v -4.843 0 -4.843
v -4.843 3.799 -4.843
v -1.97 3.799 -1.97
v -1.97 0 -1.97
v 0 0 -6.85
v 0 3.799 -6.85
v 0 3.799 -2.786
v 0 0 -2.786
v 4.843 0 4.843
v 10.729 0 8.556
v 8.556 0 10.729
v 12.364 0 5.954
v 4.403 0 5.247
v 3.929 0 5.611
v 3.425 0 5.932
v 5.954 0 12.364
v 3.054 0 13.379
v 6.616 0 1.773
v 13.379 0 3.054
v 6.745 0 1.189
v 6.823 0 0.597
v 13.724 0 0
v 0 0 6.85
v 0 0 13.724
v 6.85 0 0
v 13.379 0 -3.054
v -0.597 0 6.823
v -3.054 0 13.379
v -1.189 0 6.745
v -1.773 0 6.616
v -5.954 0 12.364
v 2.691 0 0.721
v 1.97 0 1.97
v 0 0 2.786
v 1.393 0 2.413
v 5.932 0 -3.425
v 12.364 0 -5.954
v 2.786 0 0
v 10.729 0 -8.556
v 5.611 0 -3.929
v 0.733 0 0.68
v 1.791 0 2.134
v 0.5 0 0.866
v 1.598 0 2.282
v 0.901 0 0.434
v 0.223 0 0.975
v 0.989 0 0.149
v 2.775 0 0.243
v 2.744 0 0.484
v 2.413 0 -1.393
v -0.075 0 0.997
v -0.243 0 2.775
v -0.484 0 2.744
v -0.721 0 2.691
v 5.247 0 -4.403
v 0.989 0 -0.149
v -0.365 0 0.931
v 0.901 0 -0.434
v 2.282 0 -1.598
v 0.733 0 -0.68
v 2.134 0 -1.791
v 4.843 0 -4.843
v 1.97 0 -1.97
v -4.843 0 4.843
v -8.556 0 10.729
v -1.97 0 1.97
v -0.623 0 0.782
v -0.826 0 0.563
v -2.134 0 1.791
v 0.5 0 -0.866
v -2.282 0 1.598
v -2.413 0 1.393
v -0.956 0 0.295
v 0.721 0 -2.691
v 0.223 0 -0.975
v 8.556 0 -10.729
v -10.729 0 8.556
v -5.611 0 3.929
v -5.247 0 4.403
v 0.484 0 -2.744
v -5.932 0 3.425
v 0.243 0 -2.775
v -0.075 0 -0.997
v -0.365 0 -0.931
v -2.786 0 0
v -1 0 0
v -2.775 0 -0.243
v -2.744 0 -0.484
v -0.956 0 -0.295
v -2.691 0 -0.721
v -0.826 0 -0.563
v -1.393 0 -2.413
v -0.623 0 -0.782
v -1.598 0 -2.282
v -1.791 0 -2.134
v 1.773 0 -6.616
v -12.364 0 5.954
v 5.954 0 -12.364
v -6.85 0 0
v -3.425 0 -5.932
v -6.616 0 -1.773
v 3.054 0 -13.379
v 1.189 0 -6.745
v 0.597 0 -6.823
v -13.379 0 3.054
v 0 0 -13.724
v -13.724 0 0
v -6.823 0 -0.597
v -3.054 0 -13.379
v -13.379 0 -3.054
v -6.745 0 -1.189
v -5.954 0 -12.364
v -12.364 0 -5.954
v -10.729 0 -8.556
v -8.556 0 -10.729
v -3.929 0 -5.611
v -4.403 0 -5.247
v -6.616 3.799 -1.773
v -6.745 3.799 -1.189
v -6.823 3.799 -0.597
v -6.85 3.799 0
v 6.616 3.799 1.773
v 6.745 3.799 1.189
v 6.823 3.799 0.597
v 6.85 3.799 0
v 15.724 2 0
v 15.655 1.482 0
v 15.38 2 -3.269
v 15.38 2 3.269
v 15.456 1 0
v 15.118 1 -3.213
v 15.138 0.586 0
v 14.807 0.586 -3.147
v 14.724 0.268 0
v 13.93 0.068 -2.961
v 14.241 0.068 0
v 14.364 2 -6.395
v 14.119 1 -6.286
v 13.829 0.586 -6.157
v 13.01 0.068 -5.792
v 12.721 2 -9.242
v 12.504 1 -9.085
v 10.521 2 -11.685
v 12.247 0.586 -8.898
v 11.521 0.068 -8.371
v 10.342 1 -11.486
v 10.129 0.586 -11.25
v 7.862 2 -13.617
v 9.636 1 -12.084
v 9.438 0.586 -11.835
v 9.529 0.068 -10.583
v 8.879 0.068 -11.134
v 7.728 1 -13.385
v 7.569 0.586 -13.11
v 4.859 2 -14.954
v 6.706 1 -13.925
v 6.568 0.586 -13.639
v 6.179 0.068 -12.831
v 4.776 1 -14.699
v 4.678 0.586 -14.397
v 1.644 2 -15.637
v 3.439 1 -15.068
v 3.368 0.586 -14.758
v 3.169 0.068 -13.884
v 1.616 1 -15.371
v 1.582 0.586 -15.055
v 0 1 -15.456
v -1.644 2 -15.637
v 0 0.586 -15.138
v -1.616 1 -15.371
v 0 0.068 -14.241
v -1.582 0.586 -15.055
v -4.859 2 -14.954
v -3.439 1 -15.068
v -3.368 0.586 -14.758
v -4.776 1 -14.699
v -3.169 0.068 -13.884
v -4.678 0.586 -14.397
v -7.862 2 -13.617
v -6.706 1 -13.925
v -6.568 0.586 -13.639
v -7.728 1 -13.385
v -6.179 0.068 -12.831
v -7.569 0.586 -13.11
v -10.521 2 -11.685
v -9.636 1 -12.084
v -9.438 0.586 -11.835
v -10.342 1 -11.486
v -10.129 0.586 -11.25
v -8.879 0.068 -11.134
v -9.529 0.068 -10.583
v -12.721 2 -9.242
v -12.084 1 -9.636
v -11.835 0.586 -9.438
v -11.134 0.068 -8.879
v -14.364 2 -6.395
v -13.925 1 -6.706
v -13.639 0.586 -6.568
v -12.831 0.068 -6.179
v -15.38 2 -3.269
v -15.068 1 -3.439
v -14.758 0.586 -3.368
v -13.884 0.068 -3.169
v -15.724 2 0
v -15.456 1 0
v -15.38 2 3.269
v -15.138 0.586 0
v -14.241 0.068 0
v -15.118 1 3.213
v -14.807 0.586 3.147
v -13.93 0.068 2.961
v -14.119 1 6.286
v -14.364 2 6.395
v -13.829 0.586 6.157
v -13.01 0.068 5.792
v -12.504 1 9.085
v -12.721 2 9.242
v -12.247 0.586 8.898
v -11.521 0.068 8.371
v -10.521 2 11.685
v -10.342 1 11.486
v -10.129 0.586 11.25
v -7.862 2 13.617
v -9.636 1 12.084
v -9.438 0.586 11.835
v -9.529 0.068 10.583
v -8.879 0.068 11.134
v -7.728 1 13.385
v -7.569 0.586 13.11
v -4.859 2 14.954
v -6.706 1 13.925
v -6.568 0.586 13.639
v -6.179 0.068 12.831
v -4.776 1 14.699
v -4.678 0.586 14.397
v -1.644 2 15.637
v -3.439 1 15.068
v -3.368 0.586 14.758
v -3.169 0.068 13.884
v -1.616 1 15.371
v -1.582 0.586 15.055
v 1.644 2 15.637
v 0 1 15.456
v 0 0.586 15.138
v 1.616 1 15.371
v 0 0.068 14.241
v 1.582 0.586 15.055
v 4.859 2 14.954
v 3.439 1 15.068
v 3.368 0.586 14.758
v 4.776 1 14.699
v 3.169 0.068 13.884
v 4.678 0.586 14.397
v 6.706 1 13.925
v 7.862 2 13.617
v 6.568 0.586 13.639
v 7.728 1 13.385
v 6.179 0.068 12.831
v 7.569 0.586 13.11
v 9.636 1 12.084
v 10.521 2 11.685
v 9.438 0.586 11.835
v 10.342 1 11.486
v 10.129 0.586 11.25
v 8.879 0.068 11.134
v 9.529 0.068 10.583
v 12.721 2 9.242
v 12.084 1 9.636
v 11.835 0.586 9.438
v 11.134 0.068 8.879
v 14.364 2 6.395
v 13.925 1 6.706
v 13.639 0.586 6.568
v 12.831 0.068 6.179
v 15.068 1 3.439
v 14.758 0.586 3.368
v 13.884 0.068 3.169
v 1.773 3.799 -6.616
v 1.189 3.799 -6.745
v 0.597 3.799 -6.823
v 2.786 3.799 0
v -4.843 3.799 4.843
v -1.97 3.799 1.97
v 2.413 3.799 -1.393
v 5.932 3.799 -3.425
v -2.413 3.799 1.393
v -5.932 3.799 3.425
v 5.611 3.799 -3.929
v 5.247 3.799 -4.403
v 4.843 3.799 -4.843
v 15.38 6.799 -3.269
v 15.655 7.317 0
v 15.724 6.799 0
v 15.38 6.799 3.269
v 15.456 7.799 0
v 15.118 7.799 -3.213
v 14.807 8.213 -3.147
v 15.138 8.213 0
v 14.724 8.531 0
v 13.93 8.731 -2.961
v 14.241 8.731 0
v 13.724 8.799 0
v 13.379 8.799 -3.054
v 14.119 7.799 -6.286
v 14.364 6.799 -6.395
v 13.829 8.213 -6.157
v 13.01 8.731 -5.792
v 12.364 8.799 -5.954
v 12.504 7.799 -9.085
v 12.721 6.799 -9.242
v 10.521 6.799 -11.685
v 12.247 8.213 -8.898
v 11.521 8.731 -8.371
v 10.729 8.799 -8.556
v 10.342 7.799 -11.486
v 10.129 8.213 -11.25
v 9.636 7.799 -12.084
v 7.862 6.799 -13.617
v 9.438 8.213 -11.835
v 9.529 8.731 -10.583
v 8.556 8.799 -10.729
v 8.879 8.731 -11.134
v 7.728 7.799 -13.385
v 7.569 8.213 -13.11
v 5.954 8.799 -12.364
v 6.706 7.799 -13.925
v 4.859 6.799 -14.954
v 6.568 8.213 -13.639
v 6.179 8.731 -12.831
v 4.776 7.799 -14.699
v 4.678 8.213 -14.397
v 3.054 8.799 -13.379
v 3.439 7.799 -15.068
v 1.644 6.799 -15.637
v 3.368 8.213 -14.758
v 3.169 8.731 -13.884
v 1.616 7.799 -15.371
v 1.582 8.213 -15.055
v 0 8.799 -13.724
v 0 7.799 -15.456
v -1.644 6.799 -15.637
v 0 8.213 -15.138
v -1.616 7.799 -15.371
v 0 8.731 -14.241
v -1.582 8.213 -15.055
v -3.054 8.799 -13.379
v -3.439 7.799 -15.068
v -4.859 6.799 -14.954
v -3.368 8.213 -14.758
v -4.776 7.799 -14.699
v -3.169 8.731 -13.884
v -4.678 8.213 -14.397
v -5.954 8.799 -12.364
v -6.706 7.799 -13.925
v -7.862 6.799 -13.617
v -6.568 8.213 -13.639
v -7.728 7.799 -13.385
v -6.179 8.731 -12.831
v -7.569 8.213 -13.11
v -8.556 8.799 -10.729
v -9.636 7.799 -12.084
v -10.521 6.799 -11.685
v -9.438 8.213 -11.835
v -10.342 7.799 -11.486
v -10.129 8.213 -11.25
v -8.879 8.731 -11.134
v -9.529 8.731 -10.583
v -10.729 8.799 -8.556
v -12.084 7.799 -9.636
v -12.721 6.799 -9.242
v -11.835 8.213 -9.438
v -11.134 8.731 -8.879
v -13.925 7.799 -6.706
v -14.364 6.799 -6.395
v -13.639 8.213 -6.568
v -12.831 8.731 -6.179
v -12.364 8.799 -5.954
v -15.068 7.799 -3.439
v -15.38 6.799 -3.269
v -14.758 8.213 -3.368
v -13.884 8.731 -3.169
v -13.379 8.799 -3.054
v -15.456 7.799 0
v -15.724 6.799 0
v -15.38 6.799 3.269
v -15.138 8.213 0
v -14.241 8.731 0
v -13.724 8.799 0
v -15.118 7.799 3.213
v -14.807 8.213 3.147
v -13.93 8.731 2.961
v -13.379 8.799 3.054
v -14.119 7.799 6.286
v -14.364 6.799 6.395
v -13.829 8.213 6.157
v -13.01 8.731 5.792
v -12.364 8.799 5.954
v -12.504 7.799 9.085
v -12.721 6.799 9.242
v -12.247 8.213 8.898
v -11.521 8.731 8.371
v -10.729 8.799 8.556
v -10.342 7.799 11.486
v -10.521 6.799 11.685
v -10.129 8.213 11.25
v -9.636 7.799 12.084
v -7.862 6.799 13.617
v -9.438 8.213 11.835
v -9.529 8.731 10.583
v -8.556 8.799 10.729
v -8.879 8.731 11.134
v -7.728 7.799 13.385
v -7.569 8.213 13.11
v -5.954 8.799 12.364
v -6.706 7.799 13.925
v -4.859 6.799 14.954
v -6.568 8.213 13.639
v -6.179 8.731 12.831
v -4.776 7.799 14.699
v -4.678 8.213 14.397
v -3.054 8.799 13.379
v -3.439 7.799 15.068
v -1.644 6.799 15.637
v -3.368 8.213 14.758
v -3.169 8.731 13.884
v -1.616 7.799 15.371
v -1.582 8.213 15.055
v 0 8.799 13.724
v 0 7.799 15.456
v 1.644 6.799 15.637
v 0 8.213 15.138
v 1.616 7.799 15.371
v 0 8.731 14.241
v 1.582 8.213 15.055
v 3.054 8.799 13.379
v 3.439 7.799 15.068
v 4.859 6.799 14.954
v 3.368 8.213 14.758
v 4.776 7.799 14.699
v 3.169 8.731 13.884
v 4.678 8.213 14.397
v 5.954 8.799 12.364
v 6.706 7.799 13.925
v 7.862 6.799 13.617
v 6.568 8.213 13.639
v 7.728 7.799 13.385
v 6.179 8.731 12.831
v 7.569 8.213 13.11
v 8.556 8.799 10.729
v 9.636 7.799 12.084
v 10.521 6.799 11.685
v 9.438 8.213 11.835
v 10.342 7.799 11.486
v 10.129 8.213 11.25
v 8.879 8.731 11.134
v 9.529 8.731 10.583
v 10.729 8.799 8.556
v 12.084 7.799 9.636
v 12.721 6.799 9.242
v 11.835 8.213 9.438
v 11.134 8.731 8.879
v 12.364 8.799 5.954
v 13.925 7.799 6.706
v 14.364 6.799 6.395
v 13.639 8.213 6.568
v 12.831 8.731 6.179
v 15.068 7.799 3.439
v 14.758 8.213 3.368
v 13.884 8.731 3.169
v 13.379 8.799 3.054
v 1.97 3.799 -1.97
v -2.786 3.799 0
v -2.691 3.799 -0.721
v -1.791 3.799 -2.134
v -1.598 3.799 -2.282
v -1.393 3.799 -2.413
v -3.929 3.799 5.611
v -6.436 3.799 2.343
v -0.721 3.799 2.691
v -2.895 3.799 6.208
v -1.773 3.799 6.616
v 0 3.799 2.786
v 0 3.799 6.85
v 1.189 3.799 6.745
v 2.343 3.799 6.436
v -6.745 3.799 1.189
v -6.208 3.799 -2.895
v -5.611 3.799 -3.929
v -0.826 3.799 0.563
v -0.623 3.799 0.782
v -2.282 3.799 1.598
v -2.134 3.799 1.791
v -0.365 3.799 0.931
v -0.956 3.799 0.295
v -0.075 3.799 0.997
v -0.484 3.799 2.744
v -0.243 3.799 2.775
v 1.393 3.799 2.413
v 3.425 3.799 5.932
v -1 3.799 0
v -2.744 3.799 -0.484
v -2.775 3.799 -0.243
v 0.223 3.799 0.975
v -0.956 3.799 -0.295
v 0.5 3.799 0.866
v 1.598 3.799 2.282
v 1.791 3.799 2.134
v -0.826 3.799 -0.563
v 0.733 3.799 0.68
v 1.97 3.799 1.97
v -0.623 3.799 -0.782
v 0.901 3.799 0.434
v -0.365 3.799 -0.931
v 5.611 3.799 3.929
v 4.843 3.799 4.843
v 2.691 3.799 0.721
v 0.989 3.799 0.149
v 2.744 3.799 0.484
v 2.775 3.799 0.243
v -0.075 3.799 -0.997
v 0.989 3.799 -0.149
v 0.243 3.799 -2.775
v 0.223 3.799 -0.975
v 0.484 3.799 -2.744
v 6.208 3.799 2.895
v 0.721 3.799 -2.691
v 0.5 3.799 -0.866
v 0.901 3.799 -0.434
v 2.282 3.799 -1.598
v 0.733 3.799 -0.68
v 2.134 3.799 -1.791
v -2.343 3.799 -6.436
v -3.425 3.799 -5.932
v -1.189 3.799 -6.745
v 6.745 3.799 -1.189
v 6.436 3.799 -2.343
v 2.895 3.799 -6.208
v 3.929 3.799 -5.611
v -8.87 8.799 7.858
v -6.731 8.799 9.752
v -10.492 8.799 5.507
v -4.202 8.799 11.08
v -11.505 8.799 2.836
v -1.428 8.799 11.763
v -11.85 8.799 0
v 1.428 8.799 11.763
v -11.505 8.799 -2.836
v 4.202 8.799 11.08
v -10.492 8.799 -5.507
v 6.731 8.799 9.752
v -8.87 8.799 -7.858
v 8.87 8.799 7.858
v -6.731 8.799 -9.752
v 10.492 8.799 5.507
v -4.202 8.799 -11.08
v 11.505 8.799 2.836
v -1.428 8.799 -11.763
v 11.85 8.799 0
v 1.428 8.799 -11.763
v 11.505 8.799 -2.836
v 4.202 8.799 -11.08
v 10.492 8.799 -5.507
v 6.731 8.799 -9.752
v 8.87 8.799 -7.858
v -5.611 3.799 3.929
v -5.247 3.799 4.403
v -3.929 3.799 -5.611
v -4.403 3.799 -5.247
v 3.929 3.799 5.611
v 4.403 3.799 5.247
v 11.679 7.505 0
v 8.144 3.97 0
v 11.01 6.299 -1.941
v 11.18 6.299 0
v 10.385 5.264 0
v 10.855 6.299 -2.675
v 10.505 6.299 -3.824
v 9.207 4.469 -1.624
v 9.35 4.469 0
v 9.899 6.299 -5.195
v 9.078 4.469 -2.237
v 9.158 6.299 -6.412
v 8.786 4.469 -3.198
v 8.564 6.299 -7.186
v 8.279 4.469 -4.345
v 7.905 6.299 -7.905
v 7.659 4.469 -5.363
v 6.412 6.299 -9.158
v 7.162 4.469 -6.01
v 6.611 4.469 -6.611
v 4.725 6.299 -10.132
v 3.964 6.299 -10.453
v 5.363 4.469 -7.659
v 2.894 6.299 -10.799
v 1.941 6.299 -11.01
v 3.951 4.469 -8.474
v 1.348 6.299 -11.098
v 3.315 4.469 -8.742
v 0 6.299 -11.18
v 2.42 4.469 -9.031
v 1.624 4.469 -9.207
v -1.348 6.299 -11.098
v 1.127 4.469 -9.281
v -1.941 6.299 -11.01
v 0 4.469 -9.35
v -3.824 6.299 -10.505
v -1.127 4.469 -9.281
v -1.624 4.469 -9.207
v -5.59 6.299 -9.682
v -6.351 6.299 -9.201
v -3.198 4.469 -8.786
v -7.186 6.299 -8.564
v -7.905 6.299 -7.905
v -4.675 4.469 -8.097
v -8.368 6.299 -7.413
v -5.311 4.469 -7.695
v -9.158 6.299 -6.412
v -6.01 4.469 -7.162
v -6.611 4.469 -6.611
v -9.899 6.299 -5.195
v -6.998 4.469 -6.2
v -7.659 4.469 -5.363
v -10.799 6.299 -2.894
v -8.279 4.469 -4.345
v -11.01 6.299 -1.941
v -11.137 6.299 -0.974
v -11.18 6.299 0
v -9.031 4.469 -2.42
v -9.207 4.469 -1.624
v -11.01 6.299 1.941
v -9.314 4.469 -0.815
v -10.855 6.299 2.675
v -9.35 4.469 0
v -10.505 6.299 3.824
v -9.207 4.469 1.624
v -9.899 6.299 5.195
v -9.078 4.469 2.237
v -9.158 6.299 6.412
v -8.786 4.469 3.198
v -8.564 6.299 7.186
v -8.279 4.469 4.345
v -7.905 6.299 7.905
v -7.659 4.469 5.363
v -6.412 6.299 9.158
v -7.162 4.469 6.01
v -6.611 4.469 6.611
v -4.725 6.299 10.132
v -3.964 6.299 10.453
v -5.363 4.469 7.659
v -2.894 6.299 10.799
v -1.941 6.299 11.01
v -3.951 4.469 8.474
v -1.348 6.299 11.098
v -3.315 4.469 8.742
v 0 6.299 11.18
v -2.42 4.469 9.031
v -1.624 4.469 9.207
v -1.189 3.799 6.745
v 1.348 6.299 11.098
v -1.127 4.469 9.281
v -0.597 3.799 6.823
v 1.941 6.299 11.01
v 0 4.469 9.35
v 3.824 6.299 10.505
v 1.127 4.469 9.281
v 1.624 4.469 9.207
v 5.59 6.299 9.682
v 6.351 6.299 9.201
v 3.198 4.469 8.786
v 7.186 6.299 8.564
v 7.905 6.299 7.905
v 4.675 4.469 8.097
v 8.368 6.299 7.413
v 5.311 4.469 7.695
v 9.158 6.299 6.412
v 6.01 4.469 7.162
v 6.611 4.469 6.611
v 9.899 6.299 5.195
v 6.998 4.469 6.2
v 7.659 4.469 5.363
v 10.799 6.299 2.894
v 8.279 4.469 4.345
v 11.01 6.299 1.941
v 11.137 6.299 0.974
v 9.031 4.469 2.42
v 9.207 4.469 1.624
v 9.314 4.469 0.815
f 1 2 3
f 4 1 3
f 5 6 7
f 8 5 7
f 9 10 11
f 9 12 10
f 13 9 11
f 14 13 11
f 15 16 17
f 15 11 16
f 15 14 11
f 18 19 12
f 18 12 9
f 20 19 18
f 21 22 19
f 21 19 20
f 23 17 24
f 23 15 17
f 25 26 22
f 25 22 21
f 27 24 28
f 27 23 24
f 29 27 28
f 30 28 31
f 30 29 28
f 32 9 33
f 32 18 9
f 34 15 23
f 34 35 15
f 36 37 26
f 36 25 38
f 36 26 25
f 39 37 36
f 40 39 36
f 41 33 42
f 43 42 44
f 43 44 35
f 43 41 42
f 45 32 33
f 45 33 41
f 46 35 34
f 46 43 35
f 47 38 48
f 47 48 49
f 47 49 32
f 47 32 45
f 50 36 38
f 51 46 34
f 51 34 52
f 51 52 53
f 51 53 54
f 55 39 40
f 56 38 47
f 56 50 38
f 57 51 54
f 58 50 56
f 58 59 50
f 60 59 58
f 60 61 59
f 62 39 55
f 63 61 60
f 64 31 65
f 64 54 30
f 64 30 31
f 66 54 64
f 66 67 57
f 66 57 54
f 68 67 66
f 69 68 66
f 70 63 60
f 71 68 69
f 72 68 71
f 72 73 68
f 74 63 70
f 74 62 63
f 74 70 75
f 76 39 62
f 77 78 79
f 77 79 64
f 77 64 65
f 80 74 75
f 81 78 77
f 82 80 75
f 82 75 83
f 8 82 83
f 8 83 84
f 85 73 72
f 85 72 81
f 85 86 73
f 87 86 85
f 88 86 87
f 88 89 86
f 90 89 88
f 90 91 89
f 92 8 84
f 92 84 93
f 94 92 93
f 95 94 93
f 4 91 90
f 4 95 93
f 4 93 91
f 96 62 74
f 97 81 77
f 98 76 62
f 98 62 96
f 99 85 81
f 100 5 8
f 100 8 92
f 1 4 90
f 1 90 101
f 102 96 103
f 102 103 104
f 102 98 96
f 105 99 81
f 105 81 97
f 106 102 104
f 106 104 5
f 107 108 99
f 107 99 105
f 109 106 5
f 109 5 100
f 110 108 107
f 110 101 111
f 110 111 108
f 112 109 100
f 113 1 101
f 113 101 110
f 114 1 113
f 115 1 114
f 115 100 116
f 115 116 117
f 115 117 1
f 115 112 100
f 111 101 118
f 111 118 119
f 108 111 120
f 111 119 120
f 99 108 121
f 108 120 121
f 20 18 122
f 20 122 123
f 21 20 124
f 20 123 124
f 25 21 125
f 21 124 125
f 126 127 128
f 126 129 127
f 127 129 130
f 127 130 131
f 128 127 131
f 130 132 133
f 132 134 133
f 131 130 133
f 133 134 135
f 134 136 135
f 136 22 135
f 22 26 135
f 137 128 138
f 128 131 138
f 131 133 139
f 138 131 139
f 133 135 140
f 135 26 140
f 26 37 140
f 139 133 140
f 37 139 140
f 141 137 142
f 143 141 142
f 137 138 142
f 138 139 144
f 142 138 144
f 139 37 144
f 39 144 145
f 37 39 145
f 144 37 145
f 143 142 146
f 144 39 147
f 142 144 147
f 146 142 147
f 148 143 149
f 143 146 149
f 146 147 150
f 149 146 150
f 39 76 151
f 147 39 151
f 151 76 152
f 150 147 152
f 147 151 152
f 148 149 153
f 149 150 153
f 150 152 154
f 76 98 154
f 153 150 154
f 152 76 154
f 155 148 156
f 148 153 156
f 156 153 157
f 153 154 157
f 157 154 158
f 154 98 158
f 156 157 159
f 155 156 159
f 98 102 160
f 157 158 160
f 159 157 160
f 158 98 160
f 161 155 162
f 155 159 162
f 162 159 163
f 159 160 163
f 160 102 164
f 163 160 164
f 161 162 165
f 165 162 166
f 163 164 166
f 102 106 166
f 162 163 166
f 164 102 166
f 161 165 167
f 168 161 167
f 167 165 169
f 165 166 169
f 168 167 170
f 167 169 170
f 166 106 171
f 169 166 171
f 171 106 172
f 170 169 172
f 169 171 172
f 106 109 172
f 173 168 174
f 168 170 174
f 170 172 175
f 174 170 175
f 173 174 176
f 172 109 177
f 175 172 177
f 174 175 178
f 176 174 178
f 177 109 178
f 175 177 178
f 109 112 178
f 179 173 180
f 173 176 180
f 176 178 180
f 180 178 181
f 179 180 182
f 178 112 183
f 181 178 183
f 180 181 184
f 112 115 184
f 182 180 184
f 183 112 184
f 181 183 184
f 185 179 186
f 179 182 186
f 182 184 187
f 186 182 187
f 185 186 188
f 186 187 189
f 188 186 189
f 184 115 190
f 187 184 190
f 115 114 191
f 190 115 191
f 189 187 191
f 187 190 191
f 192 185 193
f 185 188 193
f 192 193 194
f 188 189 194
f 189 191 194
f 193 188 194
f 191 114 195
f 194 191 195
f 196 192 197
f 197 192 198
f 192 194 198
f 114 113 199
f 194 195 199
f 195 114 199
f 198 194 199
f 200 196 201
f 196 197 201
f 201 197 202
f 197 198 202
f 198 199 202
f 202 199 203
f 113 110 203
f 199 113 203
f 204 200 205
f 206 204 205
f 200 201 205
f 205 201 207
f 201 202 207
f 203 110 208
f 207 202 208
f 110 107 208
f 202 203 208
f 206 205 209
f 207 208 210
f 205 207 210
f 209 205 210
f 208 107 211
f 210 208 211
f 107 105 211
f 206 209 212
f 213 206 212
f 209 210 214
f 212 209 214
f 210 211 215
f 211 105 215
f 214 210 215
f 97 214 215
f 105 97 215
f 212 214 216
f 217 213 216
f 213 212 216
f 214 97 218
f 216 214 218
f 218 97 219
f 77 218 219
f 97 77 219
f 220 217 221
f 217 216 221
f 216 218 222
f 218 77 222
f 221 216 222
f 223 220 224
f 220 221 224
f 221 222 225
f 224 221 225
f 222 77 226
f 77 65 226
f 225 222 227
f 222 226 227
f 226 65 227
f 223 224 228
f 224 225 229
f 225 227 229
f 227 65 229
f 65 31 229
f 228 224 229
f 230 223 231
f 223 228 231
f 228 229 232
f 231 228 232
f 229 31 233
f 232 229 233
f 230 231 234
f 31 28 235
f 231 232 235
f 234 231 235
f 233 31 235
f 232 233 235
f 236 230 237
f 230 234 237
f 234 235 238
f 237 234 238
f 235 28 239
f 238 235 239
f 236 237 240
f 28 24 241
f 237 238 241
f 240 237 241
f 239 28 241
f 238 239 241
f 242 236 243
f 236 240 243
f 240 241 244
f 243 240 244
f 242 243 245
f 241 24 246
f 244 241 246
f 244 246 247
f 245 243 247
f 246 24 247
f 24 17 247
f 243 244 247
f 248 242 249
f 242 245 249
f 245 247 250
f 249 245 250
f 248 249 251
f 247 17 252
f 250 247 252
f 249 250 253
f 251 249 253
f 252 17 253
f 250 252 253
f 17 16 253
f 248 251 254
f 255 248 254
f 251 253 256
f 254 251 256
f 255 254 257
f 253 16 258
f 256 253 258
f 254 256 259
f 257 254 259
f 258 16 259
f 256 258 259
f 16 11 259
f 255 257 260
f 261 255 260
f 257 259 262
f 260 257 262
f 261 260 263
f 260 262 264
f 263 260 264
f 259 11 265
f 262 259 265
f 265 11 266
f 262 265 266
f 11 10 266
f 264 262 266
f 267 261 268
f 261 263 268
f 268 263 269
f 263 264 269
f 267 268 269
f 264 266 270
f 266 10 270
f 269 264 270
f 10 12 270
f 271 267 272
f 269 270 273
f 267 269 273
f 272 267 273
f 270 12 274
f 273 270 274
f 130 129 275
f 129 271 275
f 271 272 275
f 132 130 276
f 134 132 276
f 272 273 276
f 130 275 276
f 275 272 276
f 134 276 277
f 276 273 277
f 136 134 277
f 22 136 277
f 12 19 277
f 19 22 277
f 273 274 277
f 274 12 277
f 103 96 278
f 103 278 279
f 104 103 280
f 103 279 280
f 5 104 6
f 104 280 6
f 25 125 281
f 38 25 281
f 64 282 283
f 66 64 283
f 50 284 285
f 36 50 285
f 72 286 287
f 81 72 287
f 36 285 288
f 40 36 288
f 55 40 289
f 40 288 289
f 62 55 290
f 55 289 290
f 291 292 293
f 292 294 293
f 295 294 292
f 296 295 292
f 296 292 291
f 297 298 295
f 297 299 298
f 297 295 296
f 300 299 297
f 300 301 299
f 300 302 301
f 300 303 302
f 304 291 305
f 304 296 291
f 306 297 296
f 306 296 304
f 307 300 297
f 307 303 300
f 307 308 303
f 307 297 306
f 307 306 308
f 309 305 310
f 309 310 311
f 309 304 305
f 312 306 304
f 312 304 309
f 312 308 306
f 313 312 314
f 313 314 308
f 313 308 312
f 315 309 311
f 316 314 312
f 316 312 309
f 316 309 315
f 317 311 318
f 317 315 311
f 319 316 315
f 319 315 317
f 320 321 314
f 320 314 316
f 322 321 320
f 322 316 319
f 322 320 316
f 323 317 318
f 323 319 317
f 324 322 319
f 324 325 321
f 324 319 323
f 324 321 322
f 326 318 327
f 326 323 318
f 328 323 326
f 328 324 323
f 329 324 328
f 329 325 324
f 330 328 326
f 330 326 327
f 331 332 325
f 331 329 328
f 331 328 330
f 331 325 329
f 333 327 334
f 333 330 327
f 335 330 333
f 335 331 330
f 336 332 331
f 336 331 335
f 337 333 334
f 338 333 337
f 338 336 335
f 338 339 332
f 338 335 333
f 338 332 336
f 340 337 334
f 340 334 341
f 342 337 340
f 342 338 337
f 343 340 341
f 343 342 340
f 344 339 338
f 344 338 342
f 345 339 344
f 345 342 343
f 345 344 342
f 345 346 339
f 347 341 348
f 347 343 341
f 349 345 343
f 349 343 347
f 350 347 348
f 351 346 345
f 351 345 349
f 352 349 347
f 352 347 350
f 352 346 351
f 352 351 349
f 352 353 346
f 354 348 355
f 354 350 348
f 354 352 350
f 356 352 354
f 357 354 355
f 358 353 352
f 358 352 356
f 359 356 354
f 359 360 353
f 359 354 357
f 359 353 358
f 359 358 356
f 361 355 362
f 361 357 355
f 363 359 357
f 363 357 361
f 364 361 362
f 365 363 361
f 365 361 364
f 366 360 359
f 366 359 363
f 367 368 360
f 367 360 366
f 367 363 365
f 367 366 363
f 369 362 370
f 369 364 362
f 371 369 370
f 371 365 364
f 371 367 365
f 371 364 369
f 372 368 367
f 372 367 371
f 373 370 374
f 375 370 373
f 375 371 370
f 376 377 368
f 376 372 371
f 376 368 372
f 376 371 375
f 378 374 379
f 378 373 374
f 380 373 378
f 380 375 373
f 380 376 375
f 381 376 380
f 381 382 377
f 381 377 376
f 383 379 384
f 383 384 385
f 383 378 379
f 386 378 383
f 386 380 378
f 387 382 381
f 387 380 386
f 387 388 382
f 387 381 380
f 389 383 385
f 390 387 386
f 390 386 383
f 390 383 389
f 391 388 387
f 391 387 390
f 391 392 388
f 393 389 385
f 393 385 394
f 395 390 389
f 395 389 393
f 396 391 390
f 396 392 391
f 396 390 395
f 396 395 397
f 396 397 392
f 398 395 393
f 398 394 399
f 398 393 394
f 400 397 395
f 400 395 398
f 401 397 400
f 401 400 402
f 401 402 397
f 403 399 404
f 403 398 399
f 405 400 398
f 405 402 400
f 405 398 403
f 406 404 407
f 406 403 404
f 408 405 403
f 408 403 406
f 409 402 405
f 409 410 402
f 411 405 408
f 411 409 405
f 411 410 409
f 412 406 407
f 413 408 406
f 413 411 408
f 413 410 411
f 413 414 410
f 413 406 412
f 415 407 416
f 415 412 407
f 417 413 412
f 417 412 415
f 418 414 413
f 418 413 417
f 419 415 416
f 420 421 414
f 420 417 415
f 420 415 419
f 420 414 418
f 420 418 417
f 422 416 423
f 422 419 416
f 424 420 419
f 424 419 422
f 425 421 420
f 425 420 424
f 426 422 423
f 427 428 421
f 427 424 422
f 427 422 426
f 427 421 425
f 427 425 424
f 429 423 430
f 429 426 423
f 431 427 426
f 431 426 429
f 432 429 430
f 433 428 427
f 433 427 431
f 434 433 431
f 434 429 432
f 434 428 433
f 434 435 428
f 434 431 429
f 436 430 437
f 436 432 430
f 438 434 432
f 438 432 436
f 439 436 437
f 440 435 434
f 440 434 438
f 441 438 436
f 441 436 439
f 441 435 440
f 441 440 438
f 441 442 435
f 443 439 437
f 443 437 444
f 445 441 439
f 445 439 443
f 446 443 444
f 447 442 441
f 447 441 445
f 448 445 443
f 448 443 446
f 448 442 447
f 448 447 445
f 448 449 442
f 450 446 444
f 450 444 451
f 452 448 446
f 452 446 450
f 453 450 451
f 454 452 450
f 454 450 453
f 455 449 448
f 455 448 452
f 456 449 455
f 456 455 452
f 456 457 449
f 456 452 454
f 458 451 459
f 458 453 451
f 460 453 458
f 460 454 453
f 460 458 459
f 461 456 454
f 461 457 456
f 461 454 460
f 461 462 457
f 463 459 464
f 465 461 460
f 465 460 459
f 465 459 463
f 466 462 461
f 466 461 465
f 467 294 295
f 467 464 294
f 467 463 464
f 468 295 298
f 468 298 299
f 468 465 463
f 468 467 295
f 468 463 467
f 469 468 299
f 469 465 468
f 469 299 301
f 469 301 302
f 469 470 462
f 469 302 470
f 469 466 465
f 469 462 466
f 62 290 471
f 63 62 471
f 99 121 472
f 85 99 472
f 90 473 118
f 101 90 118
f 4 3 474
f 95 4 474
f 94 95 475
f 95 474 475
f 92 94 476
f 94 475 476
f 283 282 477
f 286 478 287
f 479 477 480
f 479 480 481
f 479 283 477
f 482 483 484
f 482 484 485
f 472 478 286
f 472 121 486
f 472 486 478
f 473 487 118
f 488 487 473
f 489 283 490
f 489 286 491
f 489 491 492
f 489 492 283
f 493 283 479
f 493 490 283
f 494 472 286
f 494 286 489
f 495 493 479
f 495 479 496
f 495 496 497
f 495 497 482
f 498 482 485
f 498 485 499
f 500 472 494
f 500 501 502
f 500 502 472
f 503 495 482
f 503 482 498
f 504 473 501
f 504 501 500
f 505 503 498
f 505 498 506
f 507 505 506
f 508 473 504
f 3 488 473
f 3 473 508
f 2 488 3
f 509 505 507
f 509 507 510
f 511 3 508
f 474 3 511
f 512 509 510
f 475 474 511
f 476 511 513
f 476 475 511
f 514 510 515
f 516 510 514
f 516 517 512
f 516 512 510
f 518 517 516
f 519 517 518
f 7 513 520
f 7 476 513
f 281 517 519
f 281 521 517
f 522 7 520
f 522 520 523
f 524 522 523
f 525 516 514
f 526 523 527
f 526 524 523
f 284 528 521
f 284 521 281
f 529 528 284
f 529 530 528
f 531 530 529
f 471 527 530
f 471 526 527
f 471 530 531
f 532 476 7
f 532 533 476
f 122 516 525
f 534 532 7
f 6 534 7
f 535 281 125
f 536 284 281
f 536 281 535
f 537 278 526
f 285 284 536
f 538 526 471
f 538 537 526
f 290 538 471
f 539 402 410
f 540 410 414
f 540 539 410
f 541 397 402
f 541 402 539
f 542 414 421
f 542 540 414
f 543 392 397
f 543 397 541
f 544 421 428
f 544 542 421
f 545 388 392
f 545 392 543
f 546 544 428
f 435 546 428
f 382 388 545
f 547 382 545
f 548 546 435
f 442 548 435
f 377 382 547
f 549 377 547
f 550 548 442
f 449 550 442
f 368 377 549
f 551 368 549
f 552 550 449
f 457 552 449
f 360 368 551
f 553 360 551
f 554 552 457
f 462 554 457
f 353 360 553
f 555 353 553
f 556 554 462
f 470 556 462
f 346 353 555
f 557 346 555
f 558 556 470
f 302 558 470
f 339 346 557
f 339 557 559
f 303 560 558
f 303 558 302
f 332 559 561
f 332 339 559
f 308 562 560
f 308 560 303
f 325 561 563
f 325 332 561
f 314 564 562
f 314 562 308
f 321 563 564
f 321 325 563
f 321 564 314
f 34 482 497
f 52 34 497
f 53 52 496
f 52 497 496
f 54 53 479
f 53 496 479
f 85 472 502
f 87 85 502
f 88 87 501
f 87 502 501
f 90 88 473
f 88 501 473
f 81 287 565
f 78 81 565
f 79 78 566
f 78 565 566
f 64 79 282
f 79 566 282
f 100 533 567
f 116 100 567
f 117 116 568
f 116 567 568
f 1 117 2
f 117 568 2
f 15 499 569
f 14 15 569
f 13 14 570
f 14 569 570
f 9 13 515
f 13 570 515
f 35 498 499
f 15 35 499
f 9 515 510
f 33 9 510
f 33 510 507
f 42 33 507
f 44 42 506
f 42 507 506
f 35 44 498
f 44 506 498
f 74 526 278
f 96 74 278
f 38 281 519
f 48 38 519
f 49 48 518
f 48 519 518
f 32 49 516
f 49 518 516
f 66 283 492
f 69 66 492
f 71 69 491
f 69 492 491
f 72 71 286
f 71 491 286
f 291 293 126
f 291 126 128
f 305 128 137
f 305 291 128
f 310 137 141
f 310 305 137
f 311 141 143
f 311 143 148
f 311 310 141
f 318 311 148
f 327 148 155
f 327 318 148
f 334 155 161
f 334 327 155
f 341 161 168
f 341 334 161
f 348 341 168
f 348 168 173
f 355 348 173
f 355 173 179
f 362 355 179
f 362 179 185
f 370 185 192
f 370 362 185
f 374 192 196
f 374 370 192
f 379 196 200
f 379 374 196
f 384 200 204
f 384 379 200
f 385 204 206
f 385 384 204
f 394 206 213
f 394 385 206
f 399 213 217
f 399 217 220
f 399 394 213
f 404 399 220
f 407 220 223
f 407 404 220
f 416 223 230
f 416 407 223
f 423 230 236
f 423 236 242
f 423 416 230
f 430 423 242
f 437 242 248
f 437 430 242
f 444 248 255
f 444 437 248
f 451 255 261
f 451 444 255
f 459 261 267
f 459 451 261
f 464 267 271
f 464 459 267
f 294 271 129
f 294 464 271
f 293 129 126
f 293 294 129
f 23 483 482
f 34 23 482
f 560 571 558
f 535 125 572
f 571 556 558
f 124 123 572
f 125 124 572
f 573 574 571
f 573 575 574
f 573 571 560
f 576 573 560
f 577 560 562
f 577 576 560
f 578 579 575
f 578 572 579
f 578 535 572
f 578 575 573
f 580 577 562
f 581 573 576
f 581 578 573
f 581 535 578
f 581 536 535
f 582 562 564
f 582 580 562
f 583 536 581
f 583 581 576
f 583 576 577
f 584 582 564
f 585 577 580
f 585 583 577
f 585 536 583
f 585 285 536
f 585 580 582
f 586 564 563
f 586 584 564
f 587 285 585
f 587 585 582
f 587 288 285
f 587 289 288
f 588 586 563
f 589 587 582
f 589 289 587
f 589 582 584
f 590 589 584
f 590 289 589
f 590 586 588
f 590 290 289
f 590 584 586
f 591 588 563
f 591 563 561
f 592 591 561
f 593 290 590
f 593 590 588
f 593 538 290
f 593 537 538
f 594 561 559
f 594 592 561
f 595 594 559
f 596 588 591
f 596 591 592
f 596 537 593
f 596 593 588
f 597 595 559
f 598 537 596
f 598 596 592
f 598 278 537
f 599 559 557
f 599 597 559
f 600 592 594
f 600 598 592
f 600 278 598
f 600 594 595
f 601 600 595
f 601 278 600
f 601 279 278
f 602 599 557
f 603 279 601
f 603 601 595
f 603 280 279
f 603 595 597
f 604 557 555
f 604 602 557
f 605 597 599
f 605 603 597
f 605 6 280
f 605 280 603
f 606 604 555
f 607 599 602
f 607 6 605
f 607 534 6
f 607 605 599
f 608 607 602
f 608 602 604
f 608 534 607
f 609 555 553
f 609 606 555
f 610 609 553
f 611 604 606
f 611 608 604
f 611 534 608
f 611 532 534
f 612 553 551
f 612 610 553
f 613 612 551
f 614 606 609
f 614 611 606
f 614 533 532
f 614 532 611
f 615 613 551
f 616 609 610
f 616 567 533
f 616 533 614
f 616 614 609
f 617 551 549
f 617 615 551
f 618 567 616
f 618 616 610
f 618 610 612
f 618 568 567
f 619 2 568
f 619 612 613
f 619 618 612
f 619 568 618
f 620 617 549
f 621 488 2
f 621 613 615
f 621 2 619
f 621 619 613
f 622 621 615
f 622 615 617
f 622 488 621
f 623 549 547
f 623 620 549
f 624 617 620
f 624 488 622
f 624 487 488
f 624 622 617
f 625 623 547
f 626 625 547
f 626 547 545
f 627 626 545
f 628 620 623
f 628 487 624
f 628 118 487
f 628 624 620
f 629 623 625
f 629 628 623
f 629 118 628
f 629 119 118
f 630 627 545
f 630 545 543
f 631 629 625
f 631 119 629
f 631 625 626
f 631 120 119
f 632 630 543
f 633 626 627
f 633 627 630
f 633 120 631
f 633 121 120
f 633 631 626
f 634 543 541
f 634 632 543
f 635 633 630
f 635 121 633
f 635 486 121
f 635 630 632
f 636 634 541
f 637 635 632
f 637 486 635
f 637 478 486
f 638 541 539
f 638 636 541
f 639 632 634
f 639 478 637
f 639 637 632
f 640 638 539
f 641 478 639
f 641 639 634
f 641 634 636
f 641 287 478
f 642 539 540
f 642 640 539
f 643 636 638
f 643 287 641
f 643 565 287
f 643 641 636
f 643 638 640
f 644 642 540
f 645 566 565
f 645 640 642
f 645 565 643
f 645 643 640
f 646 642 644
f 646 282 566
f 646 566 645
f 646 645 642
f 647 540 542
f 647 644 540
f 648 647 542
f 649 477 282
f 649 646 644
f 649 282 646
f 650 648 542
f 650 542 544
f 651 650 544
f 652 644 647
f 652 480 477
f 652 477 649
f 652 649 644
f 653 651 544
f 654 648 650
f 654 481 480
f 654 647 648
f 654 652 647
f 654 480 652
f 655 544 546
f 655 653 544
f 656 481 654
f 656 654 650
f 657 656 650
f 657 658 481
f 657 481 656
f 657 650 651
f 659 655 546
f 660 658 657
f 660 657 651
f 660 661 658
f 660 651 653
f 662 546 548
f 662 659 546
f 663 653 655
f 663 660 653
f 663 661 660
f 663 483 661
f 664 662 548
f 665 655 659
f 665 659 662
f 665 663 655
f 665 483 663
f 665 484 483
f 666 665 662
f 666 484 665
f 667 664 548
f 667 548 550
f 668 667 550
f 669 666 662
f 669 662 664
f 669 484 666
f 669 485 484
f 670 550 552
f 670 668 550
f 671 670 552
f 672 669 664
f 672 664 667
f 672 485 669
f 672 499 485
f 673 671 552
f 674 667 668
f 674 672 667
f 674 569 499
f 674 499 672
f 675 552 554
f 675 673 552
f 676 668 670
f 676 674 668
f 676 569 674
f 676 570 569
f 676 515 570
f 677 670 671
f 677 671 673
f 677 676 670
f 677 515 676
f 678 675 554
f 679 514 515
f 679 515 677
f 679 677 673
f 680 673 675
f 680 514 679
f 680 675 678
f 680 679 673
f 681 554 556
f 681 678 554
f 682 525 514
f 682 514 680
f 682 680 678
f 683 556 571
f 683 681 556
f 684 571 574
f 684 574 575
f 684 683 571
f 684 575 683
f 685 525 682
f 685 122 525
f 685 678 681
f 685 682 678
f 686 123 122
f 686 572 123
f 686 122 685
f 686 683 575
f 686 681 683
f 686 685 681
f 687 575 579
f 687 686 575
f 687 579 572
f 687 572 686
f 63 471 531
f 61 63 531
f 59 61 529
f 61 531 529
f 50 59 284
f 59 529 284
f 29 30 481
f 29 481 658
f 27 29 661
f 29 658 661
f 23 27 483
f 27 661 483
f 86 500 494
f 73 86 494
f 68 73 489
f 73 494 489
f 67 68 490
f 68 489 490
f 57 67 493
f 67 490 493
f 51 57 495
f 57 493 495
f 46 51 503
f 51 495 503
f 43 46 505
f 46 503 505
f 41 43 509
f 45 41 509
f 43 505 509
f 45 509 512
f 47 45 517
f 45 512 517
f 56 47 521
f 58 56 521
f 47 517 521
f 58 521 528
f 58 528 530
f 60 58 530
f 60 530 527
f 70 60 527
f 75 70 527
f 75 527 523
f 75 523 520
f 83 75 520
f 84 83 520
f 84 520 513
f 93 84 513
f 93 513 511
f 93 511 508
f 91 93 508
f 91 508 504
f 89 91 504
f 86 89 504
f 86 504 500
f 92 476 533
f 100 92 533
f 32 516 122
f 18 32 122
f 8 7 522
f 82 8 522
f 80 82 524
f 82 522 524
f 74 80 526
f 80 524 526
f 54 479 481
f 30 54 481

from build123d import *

# Parameters (mm, degrees)
F2_R     = 1
F3_DEPTH = 8.79914
F4_R     = 2
F5_R     = 2


with BuildPart() as f1:
    # F0 (on Top) → F1 (revolve)
    with BuildSketch(Plane.XY):
        with BuildLine():
            Line((0, 3.79914), (0, 0))
            Line((0, 0), (15.723543, 0))
            Line((15.723543, 0), (15.723543, 8.79914))
            Line((15.723543, 8.79914), (11.849537, 8.79914))
            ThreePointArc((11.849537, 8.79914), (10.385071, 5.263606), (6.849537, 3.79914))
            Line((6.849537, 3.79914), (0, 3.79914))
        make_face()
    revolve(axis=Axis((0, 5, 0), (0, 1, 0)))

    # F2 (on face) → F3 (cut, through all)
    with BuildSketch(Plane(origin=(0, 8.79914, 0), x_dir=(-1, 0, 0), z_dir=(0, 1, 0))):
        with BuildLine():
            ThreePointArc((0, 2.785922), (0.363636, 2.762088), (0.72105, 2.690994))
            Line((0.72105, 2.690994), (1.772791, 6.616145))
            ThreePointArc((1.772791, 6.616145), (0.894044, 6.790939), (0, 6.849537))
            Line((0, 6.849537), (0, 2.785922))
        make_face()
        with BuildLine():
            ThreePointArc((-3.424769, 5.931873), (-4.169734, 5.434103), (-4.843354, 4.843354))
            Line((-4.843354, 4.843354), (-1.969944, 1.969944))
            ThreePointArc((-1.969944, 1.969944), (-1.695962, 2.21022), (-1.392961, 2.412679))
            Line((-1.392961, 2.412679), (-3.424769, 5.931873))
        make_face()
        with BuildLine():
            ThreePointArc((-6.616145, 1.772791), (-6.790939, 0.894044), (-6.849537, 0))
            Line((-6.849537, 0), (-2.785922, 0))
            ThreePointArc((-2.785922, 0), (-2.762088, 0.363636), (-2.690994, 0.72105))
            Line((-2.690994, 0.72105), (-6.616145, 1.772791))
        make_face()
        with BuildLine():
            ThreePointArc((-5.931873, -3.424769), (-5.434103, -4.169734), (-4.843354, -4.843354))
            Line((-4.843354, -4.843354), (-1.969944, -1.969944))
            ThreePointArc((-1.969944, -1.969944), (-2.21022, -1.695962), (-2.412679, -1.392961))
            Line((-2.412679, -1.392961), (-5.931873, -3.424769))
        make_face()
        with BuildLine():
            ThreePointArc((-1.772791, -6.616145), (-0.894044, -6.790939), (0, -6.849537))
            Line((0, -6.849537), (0, -2.785922))
            ThreePointArc((0, -2.785922), (-0.363636, -2.762088), (-0.72105, -2.690994))
            Line((-0.72105, -2.690994), (-1.772791, -6.616145))
        make_face()
        with BuildLine():
            ThreePointArc((3.424769, -5.931873), (4.169734, -5.434103), (4.843354, -4.843354))
            Line((4.843354, -4.843354), (1.969944, -1.969944))
            ThreePointArc((1.969944, -1.969944), (1.695962, -2.21022), (1.392961, -2.412679))
            Line((1.392961, -2.412679), (3.424769, -5.931873))
        make_face()
        with BuildLine():
            ThreePointArc((6.616145, -1.772791), (6.790939, -0.894044), (6.849537, 0))
            Line((6.849537, 0), (2.785922, 0))
            ThreePointArc((2.785922, 0), (2.762088, -0.363636), (2.690994, -0.72105))
            Line((2.690994, -0.72105), (6.616145, -1.772791))
        make_face()
        with BuildLine():
            ThreePointArc((5.931873, 3.424769), (5.434103, 4.169734), (4.843354, 4.843354))
            Line((4.843354, 4.843354), (1.969944, 1.969944))
            ThreePointArc((1.969944, 1.969944), (2.21022, 1.695962), (2.412679, 1.392961))
            Line((2.412679, 1.392961), (5.931873, 3.424769))
        make_face()
        Circle(F2_R)
    extrude(amount=-F3_DEPTH, mode=Mode.SUBTRACT)

    # F4
    f4_edges = [f1.edges().sort_by_distance(p)[0] for p in [
        (-15.723543, 8.79914, 0),
    ]]
    fillet(f4_edges, radius=F4_R)

    # F5
    f5_edges = [f1.edges().sort_by_distance(p)[0] for p in [
        (-15.723543, 0, 0),
    ]]
    fillet(f5_edges, radius=F5_R)


solid = f1.part
